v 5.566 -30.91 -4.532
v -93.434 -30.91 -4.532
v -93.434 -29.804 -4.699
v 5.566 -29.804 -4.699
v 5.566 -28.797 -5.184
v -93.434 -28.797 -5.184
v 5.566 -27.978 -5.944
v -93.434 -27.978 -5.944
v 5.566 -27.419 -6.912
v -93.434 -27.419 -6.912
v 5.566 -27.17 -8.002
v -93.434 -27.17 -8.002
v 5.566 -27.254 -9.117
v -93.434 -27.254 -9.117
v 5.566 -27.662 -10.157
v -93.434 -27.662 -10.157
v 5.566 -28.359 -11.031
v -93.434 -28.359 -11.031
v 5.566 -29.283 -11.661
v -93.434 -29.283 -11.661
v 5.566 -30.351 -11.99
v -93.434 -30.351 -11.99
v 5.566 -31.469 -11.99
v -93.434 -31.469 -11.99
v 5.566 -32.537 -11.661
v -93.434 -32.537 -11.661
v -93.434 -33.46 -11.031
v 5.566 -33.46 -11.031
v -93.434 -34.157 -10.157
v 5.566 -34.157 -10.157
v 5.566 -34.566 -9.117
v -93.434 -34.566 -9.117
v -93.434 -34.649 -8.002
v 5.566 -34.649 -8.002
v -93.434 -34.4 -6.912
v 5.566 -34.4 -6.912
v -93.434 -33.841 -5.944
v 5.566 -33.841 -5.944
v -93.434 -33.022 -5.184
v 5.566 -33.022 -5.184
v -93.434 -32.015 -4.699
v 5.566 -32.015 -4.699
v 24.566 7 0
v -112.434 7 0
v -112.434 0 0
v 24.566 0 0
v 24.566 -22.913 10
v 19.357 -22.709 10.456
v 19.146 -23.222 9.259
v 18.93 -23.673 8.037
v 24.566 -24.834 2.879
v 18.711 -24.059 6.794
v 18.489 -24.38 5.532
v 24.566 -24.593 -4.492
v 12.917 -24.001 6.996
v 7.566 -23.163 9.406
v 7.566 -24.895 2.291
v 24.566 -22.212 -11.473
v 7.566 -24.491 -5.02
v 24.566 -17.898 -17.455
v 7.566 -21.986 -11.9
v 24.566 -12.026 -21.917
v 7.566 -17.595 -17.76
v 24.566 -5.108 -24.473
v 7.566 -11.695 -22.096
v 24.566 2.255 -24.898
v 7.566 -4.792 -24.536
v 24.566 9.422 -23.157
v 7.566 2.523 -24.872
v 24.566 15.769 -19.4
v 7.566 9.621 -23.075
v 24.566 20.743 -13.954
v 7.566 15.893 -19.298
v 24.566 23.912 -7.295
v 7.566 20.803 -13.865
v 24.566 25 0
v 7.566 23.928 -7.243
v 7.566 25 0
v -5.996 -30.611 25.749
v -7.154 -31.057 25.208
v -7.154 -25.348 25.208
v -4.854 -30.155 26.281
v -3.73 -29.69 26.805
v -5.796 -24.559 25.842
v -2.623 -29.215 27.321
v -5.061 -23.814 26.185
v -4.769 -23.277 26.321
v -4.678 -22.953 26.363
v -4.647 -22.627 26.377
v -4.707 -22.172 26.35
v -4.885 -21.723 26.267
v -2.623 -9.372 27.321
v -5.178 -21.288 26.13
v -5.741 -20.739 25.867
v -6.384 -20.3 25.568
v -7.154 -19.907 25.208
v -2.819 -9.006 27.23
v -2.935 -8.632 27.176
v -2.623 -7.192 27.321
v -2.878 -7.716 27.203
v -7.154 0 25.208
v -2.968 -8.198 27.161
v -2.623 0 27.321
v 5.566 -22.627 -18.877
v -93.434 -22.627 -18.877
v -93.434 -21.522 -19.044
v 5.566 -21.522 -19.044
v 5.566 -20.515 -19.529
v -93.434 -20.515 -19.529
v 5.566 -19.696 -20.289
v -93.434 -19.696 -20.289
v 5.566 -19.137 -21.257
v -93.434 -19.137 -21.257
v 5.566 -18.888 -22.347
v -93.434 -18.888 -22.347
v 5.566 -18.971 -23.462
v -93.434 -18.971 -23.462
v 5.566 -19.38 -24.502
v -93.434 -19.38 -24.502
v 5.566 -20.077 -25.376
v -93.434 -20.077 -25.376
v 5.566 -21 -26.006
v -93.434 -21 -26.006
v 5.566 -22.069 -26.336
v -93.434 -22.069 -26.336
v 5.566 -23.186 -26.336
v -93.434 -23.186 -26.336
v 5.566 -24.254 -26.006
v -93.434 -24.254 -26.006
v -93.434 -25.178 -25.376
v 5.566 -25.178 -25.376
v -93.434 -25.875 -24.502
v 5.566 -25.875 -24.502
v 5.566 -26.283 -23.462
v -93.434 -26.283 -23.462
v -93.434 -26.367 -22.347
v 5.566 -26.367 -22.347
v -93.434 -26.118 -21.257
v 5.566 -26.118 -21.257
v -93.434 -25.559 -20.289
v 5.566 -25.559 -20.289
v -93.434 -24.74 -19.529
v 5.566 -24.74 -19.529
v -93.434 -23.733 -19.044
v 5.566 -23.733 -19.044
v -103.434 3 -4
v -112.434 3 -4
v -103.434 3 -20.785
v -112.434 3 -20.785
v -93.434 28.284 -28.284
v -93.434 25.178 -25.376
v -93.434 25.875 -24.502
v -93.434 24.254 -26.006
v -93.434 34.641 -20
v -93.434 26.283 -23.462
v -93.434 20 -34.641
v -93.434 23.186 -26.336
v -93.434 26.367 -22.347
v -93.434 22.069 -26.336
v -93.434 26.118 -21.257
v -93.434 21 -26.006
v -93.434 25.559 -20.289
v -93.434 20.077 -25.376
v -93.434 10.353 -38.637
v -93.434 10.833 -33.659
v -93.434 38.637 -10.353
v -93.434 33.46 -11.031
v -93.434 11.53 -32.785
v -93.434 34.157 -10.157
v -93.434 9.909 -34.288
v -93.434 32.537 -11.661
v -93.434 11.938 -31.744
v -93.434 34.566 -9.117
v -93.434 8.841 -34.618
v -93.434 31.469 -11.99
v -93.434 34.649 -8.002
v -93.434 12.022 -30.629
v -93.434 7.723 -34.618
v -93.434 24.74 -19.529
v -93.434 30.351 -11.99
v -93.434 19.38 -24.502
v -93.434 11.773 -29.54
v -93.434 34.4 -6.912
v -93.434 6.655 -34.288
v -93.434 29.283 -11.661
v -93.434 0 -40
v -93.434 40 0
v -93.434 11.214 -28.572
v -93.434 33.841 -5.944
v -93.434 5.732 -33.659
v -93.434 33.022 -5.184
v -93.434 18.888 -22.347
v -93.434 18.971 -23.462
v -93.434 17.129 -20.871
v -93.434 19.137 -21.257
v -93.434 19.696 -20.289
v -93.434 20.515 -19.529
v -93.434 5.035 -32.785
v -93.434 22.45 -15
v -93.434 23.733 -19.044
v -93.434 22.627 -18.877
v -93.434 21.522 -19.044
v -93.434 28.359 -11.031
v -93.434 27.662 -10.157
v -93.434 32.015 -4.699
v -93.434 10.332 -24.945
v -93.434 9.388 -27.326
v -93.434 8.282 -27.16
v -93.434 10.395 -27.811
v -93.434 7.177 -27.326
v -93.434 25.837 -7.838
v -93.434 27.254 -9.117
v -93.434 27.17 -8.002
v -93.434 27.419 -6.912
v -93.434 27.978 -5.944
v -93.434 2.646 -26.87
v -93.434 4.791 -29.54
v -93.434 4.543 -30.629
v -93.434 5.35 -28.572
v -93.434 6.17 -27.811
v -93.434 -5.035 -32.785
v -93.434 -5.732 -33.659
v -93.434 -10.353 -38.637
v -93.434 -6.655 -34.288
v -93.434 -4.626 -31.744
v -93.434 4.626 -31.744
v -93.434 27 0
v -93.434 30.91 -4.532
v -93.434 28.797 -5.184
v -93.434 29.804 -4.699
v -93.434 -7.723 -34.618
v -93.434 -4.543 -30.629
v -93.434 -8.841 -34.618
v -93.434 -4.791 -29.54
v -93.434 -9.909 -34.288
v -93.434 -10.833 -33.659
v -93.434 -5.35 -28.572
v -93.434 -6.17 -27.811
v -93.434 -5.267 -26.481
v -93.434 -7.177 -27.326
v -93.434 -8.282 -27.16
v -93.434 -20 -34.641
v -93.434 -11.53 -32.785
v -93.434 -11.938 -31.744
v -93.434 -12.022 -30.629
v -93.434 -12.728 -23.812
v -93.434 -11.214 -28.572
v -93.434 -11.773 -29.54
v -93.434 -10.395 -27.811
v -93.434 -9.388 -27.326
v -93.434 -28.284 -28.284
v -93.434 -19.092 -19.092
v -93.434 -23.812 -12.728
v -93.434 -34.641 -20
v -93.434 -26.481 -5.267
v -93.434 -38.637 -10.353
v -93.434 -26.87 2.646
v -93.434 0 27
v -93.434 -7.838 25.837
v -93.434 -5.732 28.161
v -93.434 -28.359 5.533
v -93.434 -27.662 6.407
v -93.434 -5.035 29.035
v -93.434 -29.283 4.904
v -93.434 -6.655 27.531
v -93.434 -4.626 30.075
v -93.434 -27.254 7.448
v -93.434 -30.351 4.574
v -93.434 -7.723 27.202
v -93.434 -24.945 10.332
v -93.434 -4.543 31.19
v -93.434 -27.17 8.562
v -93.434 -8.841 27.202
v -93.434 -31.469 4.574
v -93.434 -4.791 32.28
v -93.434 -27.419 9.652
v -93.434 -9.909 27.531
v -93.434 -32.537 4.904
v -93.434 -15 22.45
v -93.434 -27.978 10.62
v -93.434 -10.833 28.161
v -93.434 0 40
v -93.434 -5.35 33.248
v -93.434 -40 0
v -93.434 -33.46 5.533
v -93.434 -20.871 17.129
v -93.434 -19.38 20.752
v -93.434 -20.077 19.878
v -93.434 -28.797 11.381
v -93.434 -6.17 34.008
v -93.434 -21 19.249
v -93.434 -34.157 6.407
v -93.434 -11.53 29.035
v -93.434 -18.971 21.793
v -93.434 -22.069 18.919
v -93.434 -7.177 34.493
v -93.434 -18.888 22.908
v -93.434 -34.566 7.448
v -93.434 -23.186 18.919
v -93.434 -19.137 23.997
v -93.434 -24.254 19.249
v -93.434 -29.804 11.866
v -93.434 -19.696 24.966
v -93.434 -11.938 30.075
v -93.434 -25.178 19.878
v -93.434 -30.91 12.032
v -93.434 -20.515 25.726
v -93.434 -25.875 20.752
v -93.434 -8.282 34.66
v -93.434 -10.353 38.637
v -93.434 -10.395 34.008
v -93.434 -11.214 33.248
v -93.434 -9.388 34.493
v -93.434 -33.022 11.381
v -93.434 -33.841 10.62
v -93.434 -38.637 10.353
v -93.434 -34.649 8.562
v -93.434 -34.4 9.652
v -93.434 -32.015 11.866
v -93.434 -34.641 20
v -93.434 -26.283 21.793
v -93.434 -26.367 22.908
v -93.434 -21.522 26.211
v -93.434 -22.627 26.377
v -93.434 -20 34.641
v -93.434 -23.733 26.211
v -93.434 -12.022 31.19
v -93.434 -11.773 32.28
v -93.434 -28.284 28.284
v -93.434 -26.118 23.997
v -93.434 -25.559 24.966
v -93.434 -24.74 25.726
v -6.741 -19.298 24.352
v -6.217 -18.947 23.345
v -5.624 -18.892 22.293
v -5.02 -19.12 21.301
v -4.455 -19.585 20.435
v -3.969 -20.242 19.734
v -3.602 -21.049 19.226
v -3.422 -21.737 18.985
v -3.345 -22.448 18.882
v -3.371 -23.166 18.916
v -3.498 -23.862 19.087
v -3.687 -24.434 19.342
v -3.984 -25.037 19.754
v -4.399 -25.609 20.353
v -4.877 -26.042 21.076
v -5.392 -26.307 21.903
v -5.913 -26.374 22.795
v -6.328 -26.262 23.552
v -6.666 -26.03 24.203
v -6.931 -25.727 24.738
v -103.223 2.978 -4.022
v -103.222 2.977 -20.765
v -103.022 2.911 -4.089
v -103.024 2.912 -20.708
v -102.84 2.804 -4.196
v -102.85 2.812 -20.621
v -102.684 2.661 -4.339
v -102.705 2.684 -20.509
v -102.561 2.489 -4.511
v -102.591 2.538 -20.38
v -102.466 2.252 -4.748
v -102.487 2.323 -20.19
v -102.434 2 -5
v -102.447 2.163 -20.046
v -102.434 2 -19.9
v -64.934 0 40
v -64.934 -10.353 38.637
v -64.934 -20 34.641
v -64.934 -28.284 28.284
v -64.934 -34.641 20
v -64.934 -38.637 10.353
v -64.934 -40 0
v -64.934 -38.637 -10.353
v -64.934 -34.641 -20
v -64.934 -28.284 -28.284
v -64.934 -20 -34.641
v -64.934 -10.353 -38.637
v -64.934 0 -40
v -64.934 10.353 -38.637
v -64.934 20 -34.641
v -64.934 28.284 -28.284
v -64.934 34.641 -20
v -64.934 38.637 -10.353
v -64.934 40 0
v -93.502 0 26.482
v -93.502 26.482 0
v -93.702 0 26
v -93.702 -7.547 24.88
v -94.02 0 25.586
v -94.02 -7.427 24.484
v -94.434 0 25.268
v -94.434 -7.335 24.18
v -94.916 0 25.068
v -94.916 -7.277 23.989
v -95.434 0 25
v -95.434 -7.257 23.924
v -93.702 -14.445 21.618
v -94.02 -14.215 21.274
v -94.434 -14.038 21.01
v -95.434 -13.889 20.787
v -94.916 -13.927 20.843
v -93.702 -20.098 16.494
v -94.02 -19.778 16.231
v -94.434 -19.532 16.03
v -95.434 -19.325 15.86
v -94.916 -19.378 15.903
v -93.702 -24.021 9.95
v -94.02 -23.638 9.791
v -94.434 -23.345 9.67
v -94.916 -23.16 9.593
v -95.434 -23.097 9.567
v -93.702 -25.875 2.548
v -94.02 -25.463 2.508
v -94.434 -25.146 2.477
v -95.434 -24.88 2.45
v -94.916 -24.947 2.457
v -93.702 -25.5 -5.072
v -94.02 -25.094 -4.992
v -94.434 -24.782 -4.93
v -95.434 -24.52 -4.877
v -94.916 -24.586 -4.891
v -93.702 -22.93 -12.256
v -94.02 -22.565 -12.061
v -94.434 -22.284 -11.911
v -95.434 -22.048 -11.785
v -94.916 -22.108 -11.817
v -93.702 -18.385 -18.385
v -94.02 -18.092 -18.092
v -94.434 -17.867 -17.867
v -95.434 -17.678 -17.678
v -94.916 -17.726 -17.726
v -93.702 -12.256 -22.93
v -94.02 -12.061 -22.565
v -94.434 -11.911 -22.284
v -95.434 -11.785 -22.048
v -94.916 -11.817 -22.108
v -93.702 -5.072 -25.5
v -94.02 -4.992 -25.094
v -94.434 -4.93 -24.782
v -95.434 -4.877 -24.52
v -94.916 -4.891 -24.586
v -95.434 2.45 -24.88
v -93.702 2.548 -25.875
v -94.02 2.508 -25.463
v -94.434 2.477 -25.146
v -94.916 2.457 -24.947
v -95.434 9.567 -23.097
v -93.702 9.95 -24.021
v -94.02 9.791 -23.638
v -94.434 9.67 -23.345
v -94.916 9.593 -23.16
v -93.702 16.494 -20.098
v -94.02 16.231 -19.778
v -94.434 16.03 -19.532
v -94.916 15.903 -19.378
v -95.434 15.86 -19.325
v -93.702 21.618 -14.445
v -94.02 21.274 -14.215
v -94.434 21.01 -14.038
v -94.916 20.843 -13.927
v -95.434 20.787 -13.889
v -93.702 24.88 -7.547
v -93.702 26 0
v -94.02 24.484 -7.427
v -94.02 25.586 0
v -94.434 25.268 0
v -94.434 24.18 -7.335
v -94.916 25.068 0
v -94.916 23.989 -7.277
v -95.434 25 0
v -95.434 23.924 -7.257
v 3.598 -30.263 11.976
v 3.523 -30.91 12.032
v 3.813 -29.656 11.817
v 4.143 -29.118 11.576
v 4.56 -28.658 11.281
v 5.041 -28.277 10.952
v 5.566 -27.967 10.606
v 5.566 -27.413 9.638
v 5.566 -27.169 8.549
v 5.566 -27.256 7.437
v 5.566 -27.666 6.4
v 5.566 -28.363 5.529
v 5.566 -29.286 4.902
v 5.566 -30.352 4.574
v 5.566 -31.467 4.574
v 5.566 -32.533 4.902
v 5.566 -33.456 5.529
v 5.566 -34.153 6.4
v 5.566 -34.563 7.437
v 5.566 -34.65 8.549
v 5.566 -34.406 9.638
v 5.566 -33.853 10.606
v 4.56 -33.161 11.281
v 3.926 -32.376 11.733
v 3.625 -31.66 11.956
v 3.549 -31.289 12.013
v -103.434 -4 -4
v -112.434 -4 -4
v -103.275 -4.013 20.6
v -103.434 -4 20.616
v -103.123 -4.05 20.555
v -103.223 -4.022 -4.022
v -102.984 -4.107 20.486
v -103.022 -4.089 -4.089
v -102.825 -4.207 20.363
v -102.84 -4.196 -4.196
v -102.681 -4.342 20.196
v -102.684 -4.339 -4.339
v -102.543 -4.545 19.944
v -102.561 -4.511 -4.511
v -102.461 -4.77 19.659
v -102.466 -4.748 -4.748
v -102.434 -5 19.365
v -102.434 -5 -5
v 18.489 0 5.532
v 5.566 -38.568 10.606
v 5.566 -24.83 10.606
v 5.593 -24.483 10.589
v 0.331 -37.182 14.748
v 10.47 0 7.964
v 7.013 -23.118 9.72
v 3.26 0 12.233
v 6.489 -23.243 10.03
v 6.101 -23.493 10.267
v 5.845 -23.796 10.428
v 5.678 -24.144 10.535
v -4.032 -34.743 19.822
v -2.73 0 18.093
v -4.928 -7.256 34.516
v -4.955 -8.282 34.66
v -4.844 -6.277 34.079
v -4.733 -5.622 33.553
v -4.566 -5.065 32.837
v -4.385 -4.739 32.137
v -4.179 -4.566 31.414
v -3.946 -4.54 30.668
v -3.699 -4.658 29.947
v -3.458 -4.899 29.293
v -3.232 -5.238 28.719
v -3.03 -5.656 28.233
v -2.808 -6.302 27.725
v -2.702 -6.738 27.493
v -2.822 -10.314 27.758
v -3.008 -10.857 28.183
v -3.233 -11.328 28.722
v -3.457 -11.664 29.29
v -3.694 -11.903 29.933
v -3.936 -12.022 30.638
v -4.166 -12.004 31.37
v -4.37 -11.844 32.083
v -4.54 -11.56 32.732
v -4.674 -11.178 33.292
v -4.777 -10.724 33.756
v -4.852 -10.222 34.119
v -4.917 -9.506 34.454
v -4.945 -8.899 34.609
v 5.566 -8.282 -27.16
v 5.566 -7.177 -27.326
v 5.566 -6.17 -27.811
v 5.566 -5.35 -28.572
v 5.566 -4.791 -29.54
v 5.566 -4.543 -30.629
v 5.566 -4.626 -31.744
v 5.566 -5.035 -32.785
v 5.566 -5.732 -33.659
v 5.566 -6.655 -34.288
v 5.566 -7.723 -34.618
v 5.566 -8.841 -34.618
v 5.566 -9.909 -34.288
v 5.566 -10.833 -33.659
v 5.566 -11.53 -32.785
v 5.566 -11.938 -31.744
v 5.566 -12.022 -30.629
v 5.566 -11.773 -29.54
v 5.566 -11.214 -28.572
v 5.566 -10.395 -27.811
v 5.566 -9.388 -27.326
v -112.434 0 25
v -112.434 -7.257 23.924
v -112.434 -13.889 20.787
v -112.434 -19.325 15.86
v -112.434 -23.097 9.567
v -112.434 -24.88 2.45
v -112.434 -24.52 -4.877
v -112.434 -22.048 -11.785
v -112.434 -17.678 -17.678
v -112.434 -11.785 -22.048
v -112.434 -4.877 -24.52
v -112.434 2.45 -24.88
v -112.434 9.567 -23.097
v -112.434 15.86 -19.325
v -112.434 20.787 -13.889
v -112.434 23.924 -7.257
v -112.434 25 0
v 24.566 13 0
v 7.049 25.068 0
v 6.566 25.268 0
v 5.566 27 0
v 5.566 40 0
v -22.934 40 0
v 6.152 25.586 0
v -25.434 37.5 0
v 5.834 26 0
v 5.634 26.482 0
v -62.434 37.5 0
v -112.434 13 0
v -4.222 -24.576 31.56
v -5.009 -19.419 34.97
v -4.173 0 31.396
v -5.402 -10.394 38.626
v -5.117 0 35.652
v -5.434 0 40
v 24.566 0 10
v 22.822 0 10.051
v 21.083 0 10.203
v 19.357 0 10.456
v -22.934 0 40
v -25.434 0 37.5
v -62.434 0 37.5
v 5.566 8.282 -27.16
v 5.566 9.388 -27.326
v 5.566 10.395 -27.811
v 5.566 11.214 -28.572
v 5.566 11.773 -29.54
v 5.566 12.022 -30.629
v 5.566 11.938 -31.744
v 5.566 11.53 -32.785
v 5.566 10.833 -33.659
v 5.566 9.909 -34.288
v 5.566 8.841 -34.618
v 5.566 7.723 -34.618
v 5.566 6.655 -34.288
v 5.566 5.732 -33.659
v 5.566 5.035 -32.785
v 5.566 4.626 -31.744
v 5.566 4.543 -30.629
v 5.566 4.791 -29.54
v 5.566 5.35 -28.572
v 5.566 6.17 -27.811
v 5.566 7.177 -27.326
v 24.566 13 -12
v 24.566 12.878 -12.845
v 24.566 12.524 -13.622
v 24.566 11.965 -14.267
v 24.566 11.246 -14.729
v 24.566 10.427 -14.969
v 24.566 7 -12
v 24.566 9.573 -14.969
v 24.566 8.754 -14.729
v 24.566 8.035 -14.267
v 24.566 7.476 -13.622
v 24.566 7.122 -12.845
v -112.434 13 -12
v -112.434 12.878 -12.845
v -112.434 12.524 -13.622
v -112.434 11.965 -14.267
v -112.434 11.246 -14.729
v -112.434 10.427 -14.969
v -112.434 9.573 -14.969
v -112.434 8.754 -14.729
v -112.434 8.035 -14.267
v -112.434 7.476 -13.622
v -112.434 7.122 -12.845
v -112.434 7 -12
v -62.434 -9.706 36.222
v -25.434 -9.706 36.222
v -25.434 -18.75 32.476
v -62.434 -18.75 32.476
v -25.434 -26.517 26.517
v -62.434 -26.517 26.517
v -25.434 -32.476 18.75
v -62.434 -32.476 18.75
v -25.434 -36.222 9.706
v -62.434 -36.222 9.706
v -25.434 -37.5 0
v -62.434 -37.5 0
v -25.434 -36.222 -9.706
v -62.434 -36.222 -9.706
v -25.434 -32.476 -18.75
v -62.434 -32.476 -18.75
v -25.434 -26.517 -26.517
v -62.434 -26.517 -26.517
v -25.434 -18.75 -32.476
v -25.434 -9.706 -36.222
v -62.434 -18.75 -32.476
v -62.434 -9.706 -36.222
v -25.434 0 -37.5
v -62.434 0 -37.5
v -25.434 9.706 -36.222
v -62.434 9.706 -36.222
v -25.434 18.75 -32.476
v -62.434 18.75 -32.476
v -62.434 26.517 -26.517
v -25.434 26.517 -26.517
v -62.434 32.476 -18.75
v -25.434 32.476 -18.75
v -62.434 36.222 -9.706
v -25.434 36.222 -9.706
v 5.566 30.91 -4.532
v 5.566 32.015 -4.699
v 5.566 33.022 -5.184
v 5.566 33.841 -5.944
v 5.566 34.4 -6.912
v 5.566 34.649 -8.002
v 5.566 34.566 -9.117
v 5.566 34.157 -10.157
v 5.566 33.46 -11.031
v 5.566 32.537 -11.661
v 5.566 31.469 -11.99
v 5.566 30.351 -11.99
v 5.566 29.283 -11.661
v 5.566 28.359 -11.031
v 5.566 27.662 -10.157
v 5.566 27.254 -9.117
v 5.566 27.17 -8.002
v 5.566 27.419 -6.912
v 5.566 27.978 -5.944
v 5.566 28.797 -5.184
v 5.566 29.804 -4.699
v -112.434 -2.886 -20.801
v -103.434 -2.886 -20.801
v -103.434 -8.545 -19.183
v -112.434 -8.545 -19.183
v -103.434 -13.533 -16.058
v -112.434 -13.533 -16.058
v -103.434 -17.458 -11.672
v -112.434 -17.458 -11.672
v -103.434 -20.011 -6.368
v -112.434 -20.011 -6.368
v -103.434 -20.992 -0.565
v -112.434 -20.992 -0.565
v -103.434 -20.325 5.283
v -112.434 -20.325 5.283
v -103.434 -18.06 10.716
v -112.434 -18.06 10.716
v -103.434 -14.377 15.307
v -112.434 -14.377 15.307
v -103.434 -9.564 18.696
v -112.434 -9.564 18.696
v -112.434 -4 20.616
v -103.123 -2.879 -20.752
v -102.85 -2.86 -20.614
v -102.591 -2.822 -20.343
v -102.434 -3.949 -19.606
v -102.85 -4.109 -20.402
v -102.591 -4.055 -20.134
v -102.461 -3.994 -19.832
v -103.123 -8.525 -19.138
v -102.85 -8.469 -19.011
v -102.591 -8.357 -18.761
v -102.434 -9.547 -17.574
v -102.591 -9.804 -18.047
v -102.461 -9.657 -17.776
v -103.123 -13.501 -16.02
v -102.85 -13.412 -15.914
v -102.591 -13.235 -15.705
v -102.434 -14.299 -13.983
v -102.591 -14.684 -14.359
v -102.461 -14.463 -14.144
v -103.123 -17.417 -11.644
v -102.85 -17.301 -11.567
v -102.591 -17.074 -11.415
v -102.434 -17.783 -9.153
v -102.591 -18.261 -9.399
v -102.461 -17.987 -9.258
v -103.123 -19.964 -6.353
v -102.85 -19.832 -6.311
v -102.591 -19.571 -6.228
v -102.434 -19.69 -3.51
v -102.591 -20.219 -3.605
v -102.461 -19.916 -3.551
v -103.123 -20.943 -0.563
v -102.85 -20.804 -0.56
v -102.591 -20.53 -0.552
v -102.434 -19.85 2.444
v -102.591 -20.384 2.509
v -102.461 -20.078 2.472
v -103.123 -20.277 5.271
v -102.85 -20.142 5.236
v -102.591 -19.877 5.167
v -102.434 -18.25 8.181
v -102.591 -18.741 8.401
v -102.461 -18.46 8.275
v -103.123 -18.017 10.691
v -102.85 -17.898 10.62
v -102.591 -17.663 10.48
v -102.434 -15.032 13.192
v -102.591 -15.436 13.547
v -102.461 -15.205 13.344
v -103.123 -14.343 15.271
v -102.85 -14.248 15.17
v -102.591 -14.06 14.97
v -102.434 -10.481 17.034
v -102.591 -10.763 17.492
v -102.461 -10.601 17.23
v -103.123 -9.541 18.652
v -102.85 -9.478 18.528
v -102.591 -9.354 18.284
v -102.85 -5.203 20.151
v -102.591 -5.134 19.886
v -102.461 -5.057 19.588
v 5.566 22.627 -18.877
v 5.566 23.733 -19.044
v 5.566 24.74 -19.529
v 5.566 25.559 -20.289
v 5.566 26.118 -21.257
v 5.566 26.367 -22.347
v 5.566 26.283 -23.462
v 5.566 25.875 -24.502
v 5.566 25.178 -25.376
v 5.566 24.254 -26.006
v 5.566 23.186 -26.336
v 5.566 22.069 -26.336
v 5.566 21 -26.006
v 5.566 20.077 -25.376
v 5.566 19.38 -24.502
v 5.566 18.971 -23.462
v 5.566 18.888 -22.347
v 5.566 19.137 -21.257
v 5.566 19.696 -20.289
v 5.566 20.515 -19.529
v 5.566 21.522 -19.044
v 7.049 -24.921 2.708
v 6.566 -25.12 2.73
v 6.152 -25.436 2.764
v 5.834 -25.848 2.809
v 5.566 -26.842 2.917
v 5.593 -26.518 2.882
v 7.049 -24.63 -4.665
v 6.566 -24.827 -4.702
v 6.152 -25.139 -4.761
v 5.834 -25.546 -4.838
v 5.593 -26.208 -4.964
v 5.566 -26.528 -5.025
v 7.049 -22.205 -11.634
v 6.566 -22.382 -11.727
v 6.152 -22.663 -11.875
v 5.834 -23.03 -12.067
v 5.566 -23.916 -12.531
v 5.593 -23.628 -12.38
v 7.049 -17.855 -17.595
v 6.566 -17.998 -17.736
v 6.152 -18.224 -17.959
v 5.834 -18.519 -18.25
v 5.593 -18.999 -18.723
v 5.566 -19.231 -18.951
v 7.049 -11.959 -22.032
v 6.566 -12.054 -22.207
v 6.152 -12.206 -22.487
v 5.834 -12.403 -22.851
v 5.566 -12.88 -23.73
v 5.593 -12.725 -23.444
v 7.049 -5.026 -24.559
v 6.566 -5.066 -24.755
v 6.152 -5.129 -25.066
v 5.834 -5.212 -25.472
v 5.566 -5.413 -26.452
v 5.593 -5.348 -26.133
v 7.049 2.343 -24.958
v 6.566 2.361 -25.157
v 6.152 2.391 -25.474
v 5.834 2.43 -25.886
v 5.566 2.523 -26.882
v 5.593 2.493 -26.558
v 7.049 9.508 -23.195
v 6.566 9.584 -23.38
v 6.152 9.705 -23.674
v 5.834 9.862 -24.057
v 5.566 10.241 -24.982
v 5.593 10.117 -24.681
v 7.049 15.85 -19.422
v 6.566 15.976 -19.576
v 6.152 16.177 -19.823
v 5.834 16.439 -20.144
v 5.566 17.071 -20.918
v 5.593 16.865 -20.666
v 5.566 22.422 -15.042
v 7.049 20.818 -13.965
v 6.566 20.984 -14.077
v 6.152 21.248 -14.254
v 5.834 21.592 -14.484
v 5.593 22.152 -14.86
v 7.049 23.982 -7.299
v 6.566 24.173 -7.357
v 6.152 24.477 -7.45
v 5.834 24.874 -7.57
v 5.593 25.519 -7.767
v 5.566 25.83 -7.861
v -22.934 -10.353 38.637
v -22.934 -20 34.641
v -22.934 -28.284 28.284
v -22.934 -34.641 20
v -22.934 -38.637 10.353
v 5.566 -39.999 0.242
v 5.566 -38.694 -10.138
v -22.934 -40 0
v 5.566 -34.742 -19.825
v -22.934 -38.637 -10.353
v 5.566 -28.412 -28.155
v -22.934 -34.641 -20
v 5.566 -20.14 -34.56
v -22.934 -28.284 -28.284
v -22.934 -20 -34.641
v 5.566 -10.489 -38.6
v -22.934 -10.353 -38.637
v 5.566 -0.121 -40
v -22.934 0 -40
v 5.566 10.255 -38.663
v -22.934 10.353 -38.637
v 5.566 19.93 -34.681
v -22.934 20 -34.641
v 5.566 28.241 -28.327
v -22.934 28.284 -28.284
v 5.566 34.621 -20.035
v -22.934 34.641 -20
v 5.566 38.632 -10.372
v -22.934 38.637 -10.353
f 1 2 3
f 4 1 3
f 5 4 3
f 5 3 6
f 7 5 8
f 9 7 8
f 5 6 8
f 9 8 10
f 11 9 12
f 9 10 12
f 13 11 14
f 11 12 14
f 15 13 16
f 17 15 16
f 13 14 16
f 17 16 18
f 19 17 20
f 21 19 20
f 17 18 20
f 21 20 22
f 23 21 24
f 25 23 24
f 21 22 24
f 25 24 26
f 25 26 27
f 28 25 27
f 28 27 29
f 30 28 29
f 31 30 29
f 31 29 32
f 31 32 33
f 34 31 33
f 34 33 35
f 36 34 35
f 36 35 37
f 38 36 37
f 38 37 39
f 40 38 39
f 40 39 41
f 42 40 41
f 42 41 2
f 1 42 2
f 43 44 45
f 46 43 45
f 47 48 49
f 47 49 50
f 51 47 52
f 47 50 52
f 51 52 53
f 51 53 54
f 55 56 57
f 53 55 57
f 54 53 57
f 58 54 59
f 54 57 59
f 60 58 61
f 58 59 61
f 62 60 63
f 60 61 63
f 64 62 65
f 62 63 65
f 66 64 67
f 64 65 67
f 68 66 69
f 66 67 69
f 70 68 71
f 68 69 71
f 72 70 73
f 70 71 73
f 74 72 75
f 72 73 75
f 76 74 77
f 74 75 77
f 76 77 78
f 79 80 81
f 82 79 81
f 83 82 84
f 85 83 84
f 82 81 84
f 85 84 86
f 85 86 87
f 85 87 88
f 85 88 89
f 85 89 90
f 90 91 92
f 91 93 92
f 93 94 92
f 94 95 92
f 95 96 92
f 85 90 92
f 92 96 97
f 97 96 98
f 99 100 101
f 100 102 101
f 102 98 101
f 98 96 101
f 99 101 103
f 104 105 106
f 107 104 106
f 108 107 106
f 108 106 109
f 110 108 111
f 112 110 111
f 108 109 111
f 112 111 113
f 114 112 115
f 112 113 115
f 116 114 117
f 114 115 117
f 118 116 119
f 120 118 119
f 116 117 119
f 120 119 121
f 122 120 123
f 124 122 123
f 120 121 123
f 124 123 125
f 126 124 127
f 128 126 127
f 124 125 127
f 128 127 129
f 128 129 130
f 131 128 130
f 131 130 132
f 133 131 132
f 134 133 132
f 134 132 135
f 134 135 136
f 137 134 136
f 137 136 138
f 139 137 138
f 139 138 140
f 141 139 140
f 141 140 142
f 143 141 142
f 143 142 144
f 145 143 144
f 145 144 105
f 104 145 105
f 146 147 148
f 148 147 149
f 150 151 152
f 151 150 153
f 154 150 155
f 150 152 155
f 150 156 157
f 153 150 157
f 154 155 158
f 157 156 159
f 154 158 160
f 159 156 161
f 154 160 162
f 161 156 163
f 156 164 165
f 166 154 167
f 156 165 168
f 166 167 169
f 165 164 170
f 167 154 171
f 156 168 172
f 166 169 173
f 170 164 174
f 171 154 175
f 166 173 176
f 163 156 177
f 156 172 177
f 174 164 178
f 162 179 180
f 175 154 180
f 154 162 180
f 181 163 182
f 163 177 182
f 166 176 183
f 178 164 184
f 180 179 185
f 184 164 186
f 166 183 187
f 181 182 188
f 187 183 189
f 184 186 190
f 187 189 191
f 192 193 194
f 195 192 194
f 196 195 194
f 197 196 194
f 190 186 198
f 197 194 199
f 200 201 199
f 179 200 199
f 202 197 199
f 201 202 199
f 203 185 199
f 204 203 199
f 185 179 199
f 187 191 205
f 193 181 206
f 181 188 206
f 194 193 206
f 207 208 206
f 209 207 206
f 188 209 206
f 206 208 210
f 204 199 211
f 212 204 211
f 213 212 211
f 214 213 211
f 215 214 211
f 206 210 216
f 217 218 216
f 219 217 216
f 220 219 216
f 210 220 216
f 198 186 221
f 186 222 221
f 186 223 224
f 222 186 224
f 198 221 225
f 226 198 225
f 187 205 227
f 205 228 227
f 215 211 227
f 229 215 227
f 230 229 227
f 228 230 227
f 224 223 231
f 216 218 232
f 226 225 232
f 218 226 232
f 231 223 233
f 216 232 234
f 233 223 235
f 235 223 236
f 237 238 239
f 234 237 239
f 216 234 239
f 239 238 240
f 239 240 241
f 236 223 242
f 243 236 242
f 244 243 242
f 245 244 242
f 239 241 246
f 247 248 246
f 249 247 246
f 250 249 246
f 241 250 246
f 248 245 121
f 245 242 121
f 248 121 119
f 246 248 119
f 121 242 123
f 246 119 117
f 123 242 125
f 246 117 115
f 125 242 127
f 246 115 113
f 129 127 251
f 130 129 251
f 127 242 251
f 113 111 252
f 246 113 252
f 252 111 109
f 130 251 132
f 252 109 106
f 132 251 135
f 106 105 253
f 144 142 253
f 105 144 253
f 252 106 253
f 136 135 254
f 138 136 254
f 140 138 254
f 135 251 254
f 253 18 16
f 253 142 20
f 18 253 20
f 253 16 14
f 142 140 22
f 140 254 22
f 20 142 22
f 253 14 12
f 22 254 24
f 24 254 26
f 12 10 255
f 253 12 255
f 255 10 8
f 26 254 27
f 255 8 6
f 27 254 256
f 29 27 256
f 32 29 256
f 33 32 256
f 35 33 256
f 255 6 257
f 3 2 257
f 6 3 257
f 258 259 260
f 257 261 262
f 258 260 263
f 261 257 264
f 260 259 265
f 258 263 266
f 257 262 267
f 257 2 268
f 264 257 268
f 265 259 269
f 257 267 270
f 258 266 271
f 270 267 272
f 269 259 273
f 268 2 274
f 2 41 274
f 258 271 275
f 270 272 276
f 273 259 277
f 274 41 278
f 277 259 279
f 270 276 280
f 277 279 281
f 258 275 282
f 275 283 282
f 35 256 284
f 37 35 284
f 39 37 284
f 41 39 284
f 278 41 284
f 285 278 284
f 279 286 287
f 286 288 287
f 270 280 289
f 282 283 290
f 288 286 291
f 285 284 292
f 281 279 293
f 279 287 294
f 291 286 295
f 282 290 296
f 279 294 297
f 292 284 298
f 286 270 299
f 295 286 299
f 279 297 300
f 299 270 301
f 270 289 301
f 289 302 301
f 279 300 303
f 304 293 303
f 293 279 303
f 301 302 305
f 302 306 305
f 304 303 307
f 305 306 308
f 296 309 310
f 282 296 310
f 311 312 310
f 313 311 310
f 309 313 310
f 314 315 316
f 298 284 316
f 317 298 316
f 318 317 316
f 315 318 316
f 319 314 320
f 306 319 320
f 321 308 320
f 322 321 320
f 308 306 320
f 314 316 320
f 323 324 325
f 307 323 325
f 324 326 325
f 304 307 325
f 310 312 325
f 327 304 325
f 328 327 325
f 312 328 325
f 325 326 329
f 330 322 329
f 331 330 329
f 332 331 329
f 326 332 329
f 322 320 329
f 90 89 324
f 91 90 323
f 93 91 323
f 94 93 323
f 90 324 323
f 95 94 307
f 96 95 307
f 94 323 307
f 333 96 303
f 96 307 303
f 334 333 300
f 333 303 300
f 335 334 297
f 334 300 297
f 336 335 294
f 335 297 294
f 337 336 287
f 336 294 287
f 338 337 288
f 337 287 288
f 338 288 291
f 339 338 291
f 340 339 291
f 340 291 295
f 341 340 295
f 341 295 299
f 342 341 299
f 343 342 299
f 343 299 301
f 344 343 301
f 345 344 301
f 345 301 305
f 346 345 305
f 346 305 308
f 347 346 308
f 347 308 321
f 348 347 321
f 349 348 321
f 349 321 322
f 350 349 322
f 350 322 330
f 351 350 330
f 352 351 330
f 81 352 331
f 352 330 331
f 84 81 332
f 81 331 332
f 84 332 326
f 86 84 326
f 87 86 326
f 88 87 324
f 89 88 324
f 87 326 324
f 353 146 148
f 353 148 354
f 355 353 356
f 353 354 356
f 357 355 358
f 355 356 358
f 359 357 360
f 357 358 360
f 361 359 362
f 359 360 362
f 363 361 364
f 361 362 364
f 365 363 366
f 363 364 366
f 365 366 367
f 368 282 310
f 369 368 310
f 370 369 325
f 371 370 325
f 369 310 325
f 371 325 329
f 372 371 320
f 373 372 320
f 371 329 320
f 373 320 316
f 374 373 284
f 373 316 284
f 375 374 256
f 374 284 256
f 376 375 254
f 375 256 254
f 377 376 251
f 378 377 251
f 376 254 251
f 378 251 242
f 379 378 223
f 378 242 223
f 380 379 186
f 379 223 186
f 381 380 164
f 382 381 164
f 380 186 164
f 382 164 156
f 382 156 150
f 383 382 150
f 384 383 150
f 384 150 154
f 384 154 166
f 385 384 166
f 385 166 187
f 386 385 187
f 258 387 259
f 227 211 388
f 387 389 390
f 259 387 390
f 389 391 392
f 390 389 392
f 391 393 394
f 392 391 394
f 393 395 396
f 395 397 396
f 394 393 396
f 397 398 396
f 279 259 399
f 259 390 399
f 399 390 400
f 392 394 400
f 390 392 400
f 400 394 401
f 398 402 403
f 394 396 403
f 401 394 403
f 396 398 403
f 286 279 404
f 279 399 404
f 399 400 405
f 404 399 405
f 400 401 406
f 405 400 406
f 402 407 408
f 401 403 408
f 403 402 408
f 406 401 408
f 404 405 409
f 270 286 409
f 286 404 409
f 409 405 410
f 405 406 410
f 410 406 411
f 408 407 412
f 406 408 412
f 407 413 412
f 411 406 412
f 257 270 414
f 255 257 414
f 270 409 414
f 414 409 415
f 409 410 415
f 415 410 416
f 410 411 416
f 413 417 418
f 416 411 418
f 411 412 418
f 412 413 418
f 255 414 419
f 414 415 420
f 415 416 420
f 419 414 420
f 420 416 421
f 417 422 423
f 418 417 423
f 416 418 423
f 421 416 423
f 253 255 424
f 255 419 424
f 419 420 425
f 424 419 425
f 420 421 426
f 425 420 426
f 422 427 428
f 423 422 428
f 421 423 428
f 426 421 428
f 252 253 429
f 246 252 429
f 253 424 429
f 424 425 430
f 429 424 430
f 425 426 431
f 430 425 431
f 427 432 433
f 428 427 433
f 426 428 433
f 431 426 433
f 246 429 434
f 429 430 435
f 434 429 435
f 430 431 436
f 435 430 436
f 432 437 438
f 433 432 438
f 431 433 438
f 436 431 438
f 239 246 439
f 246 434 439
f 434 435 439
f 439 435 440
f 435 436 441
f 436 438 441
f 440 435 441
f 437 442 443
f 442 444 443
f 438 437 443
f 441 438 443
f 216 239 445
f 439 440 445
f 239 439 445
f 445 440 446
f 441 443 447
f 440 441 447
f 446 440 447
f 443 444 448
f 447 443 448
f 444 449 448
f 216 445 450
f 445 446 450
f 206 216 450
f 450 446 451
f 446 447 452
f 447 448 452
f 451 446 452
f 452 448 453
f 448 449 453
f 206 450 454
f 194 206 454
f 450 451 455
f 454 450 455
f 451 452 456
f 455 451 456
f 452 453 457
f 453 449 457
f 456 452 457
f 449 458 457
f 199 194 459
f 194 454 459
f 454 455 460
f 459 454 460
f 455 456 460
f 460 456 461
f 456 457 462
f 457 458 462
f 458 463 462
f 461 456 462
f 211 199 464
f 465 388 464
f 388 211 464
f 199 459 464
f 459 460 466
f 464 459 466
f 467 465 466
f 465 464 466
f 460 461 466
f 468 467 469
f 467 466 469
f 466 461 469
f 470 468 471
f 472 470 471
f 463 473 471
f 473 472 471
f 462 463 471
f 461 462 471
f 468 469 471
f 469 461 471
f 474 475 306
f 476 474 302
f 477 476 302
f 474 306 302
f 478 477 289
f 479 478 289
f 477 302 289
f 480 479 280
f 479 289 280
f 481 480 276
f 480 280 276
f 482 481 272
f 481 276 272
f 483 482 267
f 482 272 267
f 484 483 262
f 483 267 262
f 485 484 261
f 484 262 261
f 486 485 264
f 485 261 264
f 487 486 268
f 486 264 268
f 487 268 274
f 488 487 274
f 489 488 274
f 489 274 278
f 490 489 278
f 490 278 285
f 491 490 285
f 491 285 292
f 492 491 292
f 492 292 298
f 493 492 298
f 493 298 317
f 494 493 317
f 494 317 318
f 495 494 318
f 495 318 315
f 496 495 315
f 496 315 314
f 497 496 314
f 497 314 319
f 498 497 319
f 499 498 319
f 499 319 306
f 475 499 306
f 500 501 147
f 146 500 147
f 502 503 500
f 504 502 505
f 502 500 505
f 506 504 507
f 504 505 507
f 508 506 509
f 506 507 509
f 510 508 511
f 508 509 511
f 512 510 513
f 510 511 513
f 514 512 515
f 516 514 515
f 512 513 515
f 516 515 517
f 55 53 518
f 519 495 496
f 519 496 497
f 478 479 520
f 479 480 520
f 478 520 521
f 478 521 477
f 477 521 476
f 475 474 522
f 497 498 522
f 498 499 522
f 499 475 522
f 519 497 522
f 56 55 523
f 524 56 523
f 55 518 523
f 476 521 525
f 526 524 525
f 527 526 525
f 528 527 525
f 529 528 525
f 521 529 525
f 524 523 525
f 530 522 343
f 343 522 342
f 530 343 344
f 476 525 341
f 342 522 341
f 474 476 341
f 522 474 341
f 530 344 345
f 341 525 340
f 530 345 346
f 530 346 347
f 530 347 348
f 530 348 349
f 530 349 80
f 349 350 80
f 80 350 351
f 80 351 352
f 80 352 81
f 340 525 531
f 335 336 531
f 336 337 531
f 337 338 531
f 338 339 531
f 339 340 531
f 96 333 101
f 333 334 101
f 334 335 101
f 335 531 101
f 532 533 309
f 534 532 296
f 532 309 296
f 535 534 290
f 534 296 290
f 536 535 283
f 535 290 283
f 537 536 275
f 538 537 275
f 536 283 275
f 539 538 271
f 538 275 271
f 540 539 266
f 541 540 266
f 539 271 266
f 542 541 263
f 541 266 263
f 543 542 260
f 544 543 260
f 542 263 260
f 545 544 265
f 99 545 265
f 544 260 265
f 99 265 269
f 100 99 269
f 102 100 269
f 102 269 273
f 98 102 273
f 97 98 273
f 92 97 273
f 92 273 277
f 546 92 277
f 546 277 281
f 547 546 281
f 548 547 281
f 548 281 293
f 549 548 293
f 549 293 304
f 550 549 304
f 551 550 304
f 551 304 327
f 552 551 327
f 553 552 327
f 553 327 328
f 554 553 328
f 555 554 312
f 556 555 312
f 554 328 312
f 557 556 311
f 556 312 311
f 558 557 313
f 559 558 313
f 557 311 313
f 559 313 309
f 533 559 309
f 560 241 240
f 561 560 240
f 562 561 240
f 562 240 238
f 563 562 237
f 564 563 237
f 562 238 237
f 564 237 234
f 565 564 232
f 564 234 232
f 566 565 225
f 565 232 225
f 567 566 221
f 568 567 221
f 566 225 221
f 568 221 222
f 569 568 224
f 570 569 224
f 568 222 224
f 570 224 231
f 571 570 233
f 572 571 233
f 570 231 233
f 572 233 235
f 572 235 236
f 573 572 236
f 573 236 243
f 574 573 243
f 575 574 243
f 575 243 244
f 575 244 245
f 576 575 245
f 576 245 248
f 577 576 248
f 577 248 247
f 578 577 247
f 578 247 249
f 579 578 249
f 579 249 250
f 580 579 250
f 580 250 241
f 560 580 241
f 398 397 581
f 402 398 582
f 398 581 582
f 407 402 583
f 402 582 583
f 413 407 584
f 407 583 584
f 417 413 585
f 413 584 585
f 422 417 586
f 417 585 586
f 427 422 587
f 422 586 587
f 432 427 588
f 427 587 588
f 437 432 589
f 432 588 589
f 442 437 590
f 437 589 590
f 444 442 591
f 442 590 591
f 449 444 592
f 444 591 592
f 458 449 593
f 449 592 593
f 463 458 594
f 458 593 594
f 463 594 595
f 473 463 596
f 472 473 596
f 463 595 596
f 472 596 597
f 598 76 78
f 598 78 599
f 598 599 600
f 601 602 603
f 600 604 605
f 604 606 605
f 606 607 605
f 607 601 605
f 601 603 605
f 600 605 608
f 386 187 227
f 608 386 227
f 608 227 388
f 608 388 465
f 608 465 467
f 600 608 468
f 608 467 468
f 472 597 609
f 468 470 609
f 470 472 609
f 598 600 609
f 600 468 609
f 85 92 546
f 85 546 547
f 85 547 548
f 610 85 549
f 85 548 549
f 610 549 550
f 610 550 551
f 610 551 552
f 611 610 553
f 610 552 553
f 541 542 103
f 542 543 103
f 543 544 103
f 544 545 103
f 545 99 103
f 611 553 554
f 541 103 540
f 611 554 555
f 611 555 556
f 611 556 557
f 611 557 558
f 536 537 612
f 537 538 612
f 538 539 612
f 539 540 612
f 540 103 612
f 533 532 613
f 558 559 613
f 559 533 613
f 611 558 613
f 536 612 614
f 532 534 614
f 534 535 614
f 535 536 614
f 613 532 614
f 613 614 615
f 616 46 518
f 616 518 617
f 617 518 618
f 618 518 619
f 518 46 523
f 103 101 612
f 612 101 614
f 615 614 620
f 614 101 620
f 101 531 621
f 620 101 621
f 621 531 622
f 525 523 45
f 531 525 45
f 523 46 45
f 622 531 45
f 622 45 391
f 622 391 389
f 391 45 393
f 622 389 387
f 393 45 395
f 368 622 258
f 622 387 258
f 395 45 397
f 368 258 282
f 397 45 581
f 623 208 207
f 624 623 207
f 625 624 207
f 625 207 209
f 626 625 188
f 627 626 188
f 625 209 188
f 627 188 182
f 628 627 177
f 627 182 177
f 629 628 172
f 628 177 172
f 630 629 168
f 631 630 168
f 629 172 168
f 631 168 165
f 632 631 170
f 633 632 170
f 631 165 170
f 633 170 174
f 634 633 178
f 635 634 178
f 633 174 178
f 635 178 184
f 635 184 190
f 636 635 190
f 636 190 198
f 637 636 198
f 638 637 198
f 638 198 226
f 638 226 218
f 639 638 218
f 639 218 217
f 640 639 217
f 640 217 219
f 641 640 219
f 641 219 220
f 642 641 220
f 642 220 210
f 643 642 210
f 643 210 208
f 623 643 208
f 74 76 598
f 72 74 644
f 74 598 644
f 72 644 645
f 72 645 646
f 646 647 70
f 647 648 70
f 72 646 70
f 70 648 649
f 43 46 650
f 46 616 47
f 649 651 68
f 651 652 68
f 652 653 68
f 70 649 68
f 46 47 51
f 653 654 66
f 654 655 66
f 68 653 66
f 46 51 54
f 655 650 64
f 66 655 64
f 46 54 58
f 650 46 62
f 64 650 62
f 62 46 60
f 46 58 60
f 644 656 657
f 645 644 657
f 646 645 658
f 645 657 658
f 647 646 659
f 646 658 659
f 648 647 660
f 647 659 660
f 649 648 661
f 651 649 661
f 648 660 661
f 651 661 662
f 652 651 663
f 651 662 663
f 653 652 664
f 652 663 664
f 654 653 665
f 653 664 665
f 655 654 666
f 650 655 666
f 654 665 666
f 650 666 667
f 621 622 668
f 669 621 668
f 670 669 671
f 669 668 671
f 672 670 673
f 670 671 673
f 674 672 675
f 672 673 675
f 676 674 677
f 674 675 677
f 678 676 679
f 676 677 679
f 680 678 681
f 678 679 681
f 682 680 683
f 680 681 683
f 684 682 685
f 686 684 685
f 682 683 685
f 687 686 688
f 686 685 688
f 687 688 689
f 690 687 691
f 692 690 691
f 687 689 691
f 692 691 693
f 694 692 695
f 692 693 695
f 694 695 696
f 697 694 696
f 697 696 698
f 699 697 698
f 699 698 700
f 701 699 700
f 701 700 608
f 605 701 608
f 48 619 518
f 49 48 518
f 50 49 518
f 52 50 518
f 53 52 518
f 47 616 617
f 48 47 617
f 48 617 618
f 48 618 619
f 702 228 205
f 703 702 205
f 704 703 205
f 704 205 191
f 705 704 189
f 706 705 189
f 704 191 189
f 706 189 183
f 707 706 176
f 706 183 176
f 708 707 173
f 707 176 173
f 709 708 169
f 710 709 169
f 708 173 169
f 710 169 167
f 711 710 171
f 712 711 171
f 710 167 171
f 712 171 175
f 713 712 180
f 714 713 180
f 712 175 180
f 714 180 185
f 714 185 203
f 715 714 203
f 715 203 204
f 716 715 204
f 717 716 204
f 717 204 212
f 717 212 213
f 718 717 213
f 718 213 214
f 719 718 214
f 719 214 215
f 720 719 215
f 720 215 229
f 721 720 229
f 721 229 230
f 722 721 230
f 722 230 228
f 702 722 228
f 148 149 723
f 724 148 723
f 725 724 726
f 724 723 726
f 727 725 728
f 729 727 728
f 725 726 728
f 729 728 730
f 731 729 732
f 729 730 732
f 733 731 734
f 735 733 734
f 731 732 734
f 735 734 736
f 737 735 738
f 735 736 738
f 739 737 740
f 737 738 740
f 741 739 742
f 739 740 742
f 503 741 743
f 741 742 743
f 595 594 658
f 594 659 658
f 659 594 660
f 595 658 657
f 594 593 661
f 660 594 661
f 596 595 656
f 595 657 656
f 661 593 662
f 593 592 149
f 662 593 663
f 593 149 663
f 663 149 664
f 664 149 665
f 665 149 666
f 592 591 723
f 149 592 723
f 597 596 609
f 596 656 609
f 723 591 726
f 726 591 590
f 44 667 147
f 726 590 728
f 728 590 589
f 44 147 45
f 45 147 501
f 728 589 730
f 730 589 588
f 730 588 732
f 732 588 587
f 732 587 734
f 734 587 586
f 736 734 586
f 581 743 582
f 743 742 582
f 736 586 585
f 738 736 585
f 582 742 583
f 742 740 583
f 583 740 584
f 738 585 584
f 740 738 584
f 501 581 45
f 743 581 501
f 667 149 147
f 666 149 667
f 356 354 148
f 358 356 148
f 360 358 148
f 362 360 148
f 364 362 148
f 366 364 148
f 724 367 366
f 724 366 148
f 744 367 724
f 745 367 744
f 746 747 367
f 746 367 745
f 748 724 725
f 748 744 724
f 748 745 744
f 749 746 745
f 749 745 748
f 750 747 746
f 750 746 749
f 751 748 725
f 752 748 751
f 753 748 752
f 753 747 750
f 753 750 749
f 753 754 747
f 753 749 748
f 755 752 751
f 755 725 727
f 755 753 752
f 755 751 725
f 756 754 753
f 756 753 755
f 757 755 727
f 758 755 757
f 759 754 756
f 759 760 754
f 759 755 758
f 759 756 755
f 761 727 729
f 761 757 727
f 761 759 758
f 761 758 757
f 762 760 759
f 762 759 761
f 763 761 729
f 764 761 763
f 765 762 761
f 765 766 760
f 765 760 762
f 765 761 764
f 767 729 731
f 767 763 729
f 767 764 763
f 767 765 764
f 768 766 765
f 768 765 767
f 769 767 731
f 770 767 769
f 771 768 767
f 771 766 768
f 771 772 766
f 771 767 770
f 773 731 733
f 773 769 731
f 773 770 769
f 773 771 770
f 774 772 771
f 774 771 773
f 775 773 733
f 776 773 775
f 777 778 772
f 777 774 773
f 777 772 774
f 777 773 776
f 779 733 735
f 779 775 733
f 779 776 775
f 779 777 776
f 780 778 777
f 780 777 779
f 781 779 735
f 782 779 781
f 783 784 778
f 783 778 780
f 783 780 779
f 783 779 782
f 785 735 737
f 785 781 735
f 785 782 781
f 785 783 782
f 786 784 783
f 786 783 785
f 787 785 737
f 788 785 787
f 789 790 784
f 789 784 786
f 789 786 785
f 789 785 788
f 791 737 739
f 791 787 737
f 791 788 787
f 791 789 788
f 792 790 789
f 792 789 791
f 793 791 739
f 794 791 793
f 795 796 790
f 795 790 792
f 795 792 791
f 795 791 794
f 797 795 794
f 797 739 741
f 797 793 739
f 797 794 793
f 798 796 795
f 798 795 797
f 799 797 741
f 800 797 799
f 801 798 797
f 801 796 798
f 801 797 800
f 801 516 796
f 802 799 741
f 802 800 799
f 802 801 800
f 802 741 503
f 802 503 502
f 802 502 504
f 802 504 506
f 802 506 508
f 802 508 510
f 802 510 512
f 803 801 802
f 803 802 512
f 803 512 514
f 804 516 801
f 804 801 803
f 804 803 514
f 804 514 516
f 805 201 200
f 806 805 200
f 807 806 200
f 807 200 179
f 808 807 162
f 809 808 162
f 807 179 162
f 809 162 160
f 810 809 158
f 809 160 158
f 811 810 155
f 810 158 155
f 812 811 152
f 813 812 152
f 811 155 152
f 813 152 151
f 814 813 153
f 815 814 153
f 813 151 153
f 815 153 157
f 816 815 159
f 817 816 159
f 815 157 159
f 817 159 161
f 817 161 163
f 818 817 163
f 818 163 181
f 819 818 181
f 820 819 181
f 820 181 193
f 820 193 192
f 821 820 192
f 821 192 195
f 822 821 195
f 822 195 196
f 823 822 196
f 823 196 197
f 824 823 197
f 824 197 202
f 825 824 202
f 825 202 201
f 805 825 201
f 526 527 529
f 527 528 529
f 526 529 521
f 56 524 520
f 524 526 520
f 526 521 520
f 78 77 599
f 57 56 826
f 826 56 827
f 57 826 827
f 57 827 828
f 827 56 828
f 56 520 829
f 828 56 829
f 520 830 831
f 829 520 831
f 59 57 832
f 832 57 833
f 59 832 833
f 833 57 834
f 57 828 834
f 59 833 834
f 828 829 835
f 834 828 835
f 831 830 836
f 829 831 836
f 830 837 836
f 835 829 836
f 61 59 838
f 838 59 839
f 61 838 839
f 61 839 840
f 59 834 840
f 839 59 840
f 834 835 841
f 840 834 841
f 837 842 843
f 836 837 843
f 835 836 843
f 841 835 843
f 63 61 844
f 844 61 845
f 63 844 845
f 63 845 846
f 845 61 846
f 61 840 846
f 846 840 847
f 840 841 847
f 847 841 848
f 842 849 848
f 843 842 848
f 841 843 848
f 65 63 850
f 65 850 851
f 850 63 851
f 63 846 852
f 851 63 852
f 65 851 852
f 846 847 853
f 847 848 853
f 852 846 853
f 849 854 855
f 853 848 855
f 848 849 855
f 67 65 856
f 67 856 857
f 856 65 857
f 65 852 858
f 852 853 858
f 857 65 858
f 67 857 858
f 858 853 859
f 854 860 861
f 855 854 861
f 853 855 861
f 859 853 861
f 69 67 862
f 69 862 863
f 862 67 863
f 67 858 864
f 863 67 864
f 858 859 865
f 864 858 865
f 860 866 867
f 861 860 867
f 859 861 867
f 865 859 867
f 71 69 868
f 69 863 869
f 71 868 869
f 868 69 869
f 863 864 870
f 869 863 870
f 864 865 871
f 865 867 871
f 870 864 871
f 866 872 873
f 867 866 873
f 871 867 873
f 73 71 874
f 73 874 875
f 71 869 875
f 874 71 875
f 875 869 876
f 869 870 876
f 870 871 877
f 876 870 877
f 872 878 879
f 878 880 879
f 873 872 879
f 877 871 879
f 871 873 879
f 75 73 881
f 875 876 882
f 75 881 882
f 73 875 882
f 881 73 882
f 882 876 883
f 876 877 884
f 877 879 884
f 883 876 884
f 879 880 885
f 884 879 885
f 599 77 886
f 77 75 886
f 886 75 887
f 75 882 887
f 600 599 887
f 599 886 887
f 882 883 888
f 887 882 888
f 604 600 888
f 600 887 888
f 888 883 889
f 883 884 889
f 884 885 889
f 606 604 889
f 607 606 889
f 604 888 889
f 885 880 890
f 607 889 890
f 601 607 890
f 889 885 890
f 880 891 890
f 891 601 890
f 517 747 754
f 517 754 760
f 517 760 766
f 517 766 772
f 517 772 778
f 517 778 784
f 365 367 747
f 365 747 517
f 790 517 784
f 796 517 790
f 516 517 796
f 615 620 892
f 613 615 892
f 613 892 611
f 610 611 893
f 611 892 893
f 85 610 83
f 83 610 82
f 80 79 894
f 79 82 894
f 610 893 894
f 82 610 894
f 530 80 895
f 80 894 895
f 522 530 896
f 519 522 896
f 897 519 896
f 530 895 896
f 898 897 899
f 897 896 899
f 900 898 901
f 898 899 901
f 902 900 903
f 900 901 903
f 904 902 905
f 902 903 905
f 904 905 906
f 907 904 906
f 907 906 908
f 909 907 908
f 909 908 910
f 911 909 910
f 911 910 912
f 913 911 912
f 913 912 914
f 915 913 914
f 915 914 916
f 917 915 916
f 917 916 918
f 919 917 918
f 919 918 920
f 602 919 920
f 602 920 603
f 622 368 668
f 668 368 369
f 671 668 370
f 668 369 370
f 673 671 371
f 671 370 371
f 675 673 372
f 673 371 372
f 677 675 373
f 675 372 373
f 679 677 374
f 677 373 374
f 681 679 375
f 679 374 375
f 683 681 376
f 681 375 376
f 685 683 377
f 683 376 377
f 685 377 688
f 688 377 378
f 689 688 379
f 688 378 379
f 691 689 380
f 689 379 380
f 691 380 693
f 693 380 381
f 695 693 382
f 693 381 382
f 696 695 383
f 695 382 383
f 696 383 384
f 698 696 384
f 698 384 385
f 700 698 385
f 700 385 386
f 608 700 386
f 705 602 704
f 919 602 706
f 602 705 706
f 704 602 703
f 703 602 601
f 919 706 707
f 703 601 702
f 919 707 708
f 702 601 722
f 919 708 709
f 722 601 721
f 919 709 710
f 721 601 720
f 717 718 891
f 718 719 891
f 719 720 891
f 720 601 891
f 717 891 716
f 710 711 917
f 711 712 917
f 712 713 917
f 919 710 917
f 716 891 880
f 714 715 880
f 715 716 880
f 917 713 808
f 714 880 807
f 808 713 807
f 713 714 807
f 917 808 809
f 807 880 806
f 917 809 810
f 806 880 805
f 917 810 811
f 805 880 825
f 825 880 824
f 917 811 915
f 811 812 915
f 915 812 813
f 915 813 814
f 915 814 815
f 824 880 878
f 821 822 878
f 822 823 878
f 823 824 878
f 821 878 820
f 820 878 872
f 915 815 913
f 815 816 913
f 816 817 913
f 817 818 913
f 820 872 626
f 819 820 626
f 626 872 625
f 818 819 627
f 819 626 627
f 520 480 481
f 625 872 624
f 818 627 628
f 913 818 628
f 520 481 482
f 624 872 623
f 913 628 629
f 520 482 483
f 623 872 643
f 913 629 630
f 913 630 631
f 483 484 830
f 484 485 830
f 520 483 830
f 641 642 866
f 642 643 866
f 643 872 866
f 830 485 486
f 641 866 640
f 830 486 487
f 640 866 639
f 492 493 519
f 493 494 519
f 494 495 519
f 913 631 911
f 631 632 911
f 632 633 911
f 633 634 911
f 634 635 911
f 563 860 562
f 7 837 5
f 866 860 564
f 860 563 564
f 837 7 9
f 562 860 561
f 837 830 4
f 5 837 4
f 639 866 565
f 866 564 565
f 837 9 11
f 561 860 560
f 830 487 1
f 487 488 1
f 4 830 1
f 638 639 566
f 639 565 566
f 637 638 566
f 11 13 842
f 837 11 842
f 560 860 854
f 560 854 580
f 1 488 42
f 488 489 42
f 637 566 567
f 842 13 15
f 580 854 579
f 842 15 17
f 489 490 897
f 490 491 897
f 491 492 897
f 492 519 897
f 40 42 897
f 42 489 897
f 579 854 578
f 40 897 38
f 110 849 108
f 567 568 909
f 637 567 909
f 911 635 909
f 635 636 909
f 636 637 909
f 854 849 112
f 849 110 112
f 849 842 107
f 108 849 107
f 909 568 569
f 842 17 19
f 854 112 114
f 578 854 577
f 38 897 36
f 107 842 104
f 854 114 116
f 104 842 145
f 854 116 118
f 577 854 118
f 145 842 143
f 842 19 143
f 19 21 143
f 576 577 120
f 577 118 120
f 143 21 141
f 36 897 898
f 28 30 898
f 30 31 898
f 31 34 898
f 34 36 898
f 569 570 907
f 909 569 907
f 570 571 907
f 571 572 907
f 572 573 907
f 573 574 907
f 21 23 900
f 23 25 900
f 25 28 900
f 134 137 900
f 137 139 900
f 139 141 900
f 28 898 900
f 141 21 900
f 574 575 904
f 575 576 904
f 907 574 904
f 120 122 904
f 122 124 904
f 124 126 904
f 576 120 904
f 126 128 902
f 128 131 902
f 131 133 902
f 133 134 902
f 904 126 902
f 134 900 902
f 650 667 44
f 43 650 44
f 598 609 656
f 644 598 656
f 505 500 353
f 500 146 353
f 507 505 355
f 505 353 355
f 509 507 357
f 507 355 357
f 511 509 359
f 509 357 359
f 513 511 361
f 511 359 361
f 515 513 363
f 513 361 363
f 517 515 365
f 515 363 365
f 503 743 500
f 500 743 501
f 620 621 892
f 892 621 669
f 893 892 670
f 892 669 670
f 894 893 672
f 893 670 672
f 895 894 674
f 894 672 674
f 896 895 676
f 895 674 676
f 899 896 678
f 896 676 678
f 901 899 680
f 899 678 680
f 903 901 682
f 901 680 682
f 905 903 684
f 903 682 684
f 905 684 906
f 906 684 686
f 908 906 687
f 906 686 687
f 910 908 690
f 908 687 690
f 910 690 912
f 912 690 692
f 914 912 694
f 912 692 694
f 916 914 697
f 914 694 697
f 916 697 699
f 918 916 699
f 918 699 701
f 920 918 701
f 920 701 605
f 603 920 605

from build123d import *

# Parameters (mm, degrees)
ENL_V_MAT_EXTRU_1_DEPTH = 149.219431924
ESQUISSE3_R             = 3.75
ENL_V_MAT_EXTRU_2_DEPTH = 131.858702424
ENL_V_MAT_EXTRU_3_DEPTH = 126.862394907
ENL_V_MAT_EXTRU_4_DEPTH = 10
CONG_1_R                = 1


with BuildPart() as part:
    # Esquisse1 → Révolution1 (revolve)
    with BuildSketch(Plane.XY, mode=Mode.PRIVATE) as r_volution1_sk:
        with BuildLine():
            Line((0, 0), (24.566275292, 0))
            Line((24.566275292, 0), (24.566275292, 25))
            Line((24.566275292, 25), (7.566275292, 25))
            ThreePointArc((7.566275292, 25), (6.152061729, 25.585786438), (5.566275292, 27))
            Line((5.566275292, 27), (5.566275292, 40))
            Line((5.566275292, 40), (-22.933724708, 40))
            Line((-22.933724708, 40), (-25.433724708, 37.5))
            Line((-25.433724708, 37.5), (-62.433724708, 37.5))
            Line((-62.433724708, 37.5), (-64.933724708, 40))
            Line((-64.933724708, 40), (-93.433724708, 40))
            Line((-93.433724708, 40), (-93.433724708, 27))
            ThreePointArc((-93.433724708, 27), (-94.019511146, 25.585786438), (-95.433724708, 25))
            Line((-95.433724708, 25), (-112.433724708, 25))
            Line((-112.433724708, 25), (-112.433724708, 0))
            Line((-112.433724708, 0), (0, 0))
        make_face()
    revolve(r_volution1_sk.sketch.rotate(Axis((-130.768922499, 0, 0), (1, 0, 0)), 90), axis=Axis((-130.768922499, 0, 0), (1, 0, 0)))

    # Esquisse2 → Enlèv. mat.-Extru.1 (cut, through all)
    with BuildSketch(Plane.ZY.offset(112.433724708)):
        with BuildLine():
            Line((0, 7), (0, 0))
            Line((0, 0), (43.449782835, 0))
            Line((43.449782835, 0), (43.449782835, 44.497429883))
            Line((43.449782835, 44.497429883), (0, 44.497429883))
            Line((0, 44.497429883), (0, 13))
            ThreePointArc((0, 13), (3, 10), (0, 7))
        make_face()
        with BuildLine():
            Line((-12, 7), (0, 7))
            ThreePointArc((0, 7), (3, 10), (0, 13))
            Line((0, 13), (-12, 13))
            ThreePointArc((-12, 13), (-15, 10), (-12, 7))
        make_face()
    extrude(amount=-ENL_V_MAT_EXTRU_1_DEPTH, mode=Mode.SUBTRACT)

    # Esquisse3 → Enlèv. mat.-Extru.2 (cut, through all)
    with BuildSketch(Plane.ZY.offset(93.433724708)):
        with Locations((-8.282209443, 30.909626441)):
            Circle(ESQUISSE3_R)
        with Locations((-22.627416998, 22.627416998)):
            Circle(ESQUISSE3_R)
        with Locations((-30.909626441, 8.282209443)):
            Circle(ESQUISSE3_R)
        with Locations((-30.909626441, -8.282209443)):
            Circle(ESQUISSE3_R)
        with Locations((-22.627416998, -22.627416998)):
            Circle(ESQUISSE3_R)
        with Locations((-8.282209443, -30.909626441)):
            Circle(ESQUISSE3_R)
        with Locations((8.282209443, -30.909626441)):
            Circle(ESQUISSE3_R)
        with Locations((22.627416998, -22.627416998)):
            Circle(ESQUISSE3_R)
        with Locations((30.909626441, -8.282209443)):
            Circle(ESQUISSE3_R)
    extrude(amount=-ENL_V_MAT_EXTRU_2_DEPTH, mode=Mode.SUBTRACT)

    # Esquisse4 → Enlèv. mat.-Extru.3 (cut, through all)
    with BuildSketch(Plane(origin=(0, 0, 0), x_dir=(1, 0, 0), z_dir=(0, 1, 0))):
        with BuildLine():
            Line((5.566275292, -31.140154495), (24.566275292, -40))
            Line((24.566275292, -40), (21.921370581, -25))
            Line((21.921370581, -25), (7.566275292, -25))
            ThreePointArc((7.566275292, -25), (6.152061729, -25.585786438), (5.566275292, -27))
            Line((5.566275292, -27), (5.566275292, -31.140154495))
        make_face()
        with BuildLine():
            Line((-5.433724708, -40), (5.566275292, -40))
            Line((5.566275292, -40), (5.566275292, -31.140154495))
            Line((5.566275292, -31.140154495), (-2.622958319, -27.321452148))
            ThreePointArc((-2.622958319, -27.321452148), (-4.722604922, -33.506811582), (-5.433724708, -40))
        make_face()
        with BuildLine():
            Line((-2.622958319, -27.321452148), (5.566275292, -31.140154495))
            Line((5.566275292, -31.140154495), (5.566275292, -27))
            ThreePointArc((5.566275292, -27), (6.152061729, -25.585786438), (7.566275292, -25))
            Line((7.566275292, -25), (21.921370581, -25))
            Line((21.921370581, -25), (19.356829962, -10.45576741))
            ThreePointArc((19.356829962, -10.45576741), (6.303432421, -16.199399791), (-2.622958319, -27.321452148))
        make_face()
        Polygon((5.566275292, -40), (24.566275292, -40), (5.566275292, -31.140154495), align=None)
        with BuildLine():
            Line((-7.154497255, -25.208360839), (-2.622958319, -27.321452148))
            ThreePointArc((-2.622958319, -27.321452148), (6.303432421, -16.199399791), (19.356829962, -10.45576741))
            Line((19.356829962, -10.45576741), (18.488589073, -5.531728645))
            ThreePointArc((18.488589073, -5.531728645), (3.259625276, -12.23263309), (-7.154497255, -25.208360839))
        make_face()
        with BuildLine():
            Line((21.921370581, -25), (24.566275292, -25))
            Line((24.566275292, -25), (24.566275292, -10))
            ThreePointArc((24.566275292, -10), (21.951603009, -10.114159057), (19.356829962, -10.45576741))
            Line((19.356829962, -10.45576741), (21.921370581, -25))
        make_face()
        Polygon((21.921370581, -25), (24.566275292, -40), (24.566275292, -25), align=None)
    extrude(amount=-ENL_V_MAT_EXTRU_3_DEPTH, mode=Mode.SUBTRACT)

    # Esquisse5 → Enlèv. mat.-Extru.4 (cut)
    with BuildSketch(Plane.ZY.offset(112.433724708)):
        with BuildLine():
            Line((20.615528128, -4), (-4, -4))
            Line((-4, -4), (-4, 3))
            Line((-4, 3), (-20.784609691, 3))
            ThreePointArc((-20.784609691, 3), (-3.501020872, -20.706106656), (20.615528128, -4))
        make_face()
    extrude(amount=-ENL_V_MAT_EXTRU_4_DEPTH, mode=Mode.SUBTRACT)

    # Congé1
    cong_1_edges = [part.edges().sort_by_distance(p)[0] for p in [
        (-102.433724708, -20.706106656, -3.501020872),
        (-102.433724708, 3, -12.392304845),
        (-102.433724708, -0.5, -4),
        (-102.433724708, -4, 8.307764064),
    ]]
    fillet(cong_1_edges, radius=CONG_1_R)


solid = part.part
